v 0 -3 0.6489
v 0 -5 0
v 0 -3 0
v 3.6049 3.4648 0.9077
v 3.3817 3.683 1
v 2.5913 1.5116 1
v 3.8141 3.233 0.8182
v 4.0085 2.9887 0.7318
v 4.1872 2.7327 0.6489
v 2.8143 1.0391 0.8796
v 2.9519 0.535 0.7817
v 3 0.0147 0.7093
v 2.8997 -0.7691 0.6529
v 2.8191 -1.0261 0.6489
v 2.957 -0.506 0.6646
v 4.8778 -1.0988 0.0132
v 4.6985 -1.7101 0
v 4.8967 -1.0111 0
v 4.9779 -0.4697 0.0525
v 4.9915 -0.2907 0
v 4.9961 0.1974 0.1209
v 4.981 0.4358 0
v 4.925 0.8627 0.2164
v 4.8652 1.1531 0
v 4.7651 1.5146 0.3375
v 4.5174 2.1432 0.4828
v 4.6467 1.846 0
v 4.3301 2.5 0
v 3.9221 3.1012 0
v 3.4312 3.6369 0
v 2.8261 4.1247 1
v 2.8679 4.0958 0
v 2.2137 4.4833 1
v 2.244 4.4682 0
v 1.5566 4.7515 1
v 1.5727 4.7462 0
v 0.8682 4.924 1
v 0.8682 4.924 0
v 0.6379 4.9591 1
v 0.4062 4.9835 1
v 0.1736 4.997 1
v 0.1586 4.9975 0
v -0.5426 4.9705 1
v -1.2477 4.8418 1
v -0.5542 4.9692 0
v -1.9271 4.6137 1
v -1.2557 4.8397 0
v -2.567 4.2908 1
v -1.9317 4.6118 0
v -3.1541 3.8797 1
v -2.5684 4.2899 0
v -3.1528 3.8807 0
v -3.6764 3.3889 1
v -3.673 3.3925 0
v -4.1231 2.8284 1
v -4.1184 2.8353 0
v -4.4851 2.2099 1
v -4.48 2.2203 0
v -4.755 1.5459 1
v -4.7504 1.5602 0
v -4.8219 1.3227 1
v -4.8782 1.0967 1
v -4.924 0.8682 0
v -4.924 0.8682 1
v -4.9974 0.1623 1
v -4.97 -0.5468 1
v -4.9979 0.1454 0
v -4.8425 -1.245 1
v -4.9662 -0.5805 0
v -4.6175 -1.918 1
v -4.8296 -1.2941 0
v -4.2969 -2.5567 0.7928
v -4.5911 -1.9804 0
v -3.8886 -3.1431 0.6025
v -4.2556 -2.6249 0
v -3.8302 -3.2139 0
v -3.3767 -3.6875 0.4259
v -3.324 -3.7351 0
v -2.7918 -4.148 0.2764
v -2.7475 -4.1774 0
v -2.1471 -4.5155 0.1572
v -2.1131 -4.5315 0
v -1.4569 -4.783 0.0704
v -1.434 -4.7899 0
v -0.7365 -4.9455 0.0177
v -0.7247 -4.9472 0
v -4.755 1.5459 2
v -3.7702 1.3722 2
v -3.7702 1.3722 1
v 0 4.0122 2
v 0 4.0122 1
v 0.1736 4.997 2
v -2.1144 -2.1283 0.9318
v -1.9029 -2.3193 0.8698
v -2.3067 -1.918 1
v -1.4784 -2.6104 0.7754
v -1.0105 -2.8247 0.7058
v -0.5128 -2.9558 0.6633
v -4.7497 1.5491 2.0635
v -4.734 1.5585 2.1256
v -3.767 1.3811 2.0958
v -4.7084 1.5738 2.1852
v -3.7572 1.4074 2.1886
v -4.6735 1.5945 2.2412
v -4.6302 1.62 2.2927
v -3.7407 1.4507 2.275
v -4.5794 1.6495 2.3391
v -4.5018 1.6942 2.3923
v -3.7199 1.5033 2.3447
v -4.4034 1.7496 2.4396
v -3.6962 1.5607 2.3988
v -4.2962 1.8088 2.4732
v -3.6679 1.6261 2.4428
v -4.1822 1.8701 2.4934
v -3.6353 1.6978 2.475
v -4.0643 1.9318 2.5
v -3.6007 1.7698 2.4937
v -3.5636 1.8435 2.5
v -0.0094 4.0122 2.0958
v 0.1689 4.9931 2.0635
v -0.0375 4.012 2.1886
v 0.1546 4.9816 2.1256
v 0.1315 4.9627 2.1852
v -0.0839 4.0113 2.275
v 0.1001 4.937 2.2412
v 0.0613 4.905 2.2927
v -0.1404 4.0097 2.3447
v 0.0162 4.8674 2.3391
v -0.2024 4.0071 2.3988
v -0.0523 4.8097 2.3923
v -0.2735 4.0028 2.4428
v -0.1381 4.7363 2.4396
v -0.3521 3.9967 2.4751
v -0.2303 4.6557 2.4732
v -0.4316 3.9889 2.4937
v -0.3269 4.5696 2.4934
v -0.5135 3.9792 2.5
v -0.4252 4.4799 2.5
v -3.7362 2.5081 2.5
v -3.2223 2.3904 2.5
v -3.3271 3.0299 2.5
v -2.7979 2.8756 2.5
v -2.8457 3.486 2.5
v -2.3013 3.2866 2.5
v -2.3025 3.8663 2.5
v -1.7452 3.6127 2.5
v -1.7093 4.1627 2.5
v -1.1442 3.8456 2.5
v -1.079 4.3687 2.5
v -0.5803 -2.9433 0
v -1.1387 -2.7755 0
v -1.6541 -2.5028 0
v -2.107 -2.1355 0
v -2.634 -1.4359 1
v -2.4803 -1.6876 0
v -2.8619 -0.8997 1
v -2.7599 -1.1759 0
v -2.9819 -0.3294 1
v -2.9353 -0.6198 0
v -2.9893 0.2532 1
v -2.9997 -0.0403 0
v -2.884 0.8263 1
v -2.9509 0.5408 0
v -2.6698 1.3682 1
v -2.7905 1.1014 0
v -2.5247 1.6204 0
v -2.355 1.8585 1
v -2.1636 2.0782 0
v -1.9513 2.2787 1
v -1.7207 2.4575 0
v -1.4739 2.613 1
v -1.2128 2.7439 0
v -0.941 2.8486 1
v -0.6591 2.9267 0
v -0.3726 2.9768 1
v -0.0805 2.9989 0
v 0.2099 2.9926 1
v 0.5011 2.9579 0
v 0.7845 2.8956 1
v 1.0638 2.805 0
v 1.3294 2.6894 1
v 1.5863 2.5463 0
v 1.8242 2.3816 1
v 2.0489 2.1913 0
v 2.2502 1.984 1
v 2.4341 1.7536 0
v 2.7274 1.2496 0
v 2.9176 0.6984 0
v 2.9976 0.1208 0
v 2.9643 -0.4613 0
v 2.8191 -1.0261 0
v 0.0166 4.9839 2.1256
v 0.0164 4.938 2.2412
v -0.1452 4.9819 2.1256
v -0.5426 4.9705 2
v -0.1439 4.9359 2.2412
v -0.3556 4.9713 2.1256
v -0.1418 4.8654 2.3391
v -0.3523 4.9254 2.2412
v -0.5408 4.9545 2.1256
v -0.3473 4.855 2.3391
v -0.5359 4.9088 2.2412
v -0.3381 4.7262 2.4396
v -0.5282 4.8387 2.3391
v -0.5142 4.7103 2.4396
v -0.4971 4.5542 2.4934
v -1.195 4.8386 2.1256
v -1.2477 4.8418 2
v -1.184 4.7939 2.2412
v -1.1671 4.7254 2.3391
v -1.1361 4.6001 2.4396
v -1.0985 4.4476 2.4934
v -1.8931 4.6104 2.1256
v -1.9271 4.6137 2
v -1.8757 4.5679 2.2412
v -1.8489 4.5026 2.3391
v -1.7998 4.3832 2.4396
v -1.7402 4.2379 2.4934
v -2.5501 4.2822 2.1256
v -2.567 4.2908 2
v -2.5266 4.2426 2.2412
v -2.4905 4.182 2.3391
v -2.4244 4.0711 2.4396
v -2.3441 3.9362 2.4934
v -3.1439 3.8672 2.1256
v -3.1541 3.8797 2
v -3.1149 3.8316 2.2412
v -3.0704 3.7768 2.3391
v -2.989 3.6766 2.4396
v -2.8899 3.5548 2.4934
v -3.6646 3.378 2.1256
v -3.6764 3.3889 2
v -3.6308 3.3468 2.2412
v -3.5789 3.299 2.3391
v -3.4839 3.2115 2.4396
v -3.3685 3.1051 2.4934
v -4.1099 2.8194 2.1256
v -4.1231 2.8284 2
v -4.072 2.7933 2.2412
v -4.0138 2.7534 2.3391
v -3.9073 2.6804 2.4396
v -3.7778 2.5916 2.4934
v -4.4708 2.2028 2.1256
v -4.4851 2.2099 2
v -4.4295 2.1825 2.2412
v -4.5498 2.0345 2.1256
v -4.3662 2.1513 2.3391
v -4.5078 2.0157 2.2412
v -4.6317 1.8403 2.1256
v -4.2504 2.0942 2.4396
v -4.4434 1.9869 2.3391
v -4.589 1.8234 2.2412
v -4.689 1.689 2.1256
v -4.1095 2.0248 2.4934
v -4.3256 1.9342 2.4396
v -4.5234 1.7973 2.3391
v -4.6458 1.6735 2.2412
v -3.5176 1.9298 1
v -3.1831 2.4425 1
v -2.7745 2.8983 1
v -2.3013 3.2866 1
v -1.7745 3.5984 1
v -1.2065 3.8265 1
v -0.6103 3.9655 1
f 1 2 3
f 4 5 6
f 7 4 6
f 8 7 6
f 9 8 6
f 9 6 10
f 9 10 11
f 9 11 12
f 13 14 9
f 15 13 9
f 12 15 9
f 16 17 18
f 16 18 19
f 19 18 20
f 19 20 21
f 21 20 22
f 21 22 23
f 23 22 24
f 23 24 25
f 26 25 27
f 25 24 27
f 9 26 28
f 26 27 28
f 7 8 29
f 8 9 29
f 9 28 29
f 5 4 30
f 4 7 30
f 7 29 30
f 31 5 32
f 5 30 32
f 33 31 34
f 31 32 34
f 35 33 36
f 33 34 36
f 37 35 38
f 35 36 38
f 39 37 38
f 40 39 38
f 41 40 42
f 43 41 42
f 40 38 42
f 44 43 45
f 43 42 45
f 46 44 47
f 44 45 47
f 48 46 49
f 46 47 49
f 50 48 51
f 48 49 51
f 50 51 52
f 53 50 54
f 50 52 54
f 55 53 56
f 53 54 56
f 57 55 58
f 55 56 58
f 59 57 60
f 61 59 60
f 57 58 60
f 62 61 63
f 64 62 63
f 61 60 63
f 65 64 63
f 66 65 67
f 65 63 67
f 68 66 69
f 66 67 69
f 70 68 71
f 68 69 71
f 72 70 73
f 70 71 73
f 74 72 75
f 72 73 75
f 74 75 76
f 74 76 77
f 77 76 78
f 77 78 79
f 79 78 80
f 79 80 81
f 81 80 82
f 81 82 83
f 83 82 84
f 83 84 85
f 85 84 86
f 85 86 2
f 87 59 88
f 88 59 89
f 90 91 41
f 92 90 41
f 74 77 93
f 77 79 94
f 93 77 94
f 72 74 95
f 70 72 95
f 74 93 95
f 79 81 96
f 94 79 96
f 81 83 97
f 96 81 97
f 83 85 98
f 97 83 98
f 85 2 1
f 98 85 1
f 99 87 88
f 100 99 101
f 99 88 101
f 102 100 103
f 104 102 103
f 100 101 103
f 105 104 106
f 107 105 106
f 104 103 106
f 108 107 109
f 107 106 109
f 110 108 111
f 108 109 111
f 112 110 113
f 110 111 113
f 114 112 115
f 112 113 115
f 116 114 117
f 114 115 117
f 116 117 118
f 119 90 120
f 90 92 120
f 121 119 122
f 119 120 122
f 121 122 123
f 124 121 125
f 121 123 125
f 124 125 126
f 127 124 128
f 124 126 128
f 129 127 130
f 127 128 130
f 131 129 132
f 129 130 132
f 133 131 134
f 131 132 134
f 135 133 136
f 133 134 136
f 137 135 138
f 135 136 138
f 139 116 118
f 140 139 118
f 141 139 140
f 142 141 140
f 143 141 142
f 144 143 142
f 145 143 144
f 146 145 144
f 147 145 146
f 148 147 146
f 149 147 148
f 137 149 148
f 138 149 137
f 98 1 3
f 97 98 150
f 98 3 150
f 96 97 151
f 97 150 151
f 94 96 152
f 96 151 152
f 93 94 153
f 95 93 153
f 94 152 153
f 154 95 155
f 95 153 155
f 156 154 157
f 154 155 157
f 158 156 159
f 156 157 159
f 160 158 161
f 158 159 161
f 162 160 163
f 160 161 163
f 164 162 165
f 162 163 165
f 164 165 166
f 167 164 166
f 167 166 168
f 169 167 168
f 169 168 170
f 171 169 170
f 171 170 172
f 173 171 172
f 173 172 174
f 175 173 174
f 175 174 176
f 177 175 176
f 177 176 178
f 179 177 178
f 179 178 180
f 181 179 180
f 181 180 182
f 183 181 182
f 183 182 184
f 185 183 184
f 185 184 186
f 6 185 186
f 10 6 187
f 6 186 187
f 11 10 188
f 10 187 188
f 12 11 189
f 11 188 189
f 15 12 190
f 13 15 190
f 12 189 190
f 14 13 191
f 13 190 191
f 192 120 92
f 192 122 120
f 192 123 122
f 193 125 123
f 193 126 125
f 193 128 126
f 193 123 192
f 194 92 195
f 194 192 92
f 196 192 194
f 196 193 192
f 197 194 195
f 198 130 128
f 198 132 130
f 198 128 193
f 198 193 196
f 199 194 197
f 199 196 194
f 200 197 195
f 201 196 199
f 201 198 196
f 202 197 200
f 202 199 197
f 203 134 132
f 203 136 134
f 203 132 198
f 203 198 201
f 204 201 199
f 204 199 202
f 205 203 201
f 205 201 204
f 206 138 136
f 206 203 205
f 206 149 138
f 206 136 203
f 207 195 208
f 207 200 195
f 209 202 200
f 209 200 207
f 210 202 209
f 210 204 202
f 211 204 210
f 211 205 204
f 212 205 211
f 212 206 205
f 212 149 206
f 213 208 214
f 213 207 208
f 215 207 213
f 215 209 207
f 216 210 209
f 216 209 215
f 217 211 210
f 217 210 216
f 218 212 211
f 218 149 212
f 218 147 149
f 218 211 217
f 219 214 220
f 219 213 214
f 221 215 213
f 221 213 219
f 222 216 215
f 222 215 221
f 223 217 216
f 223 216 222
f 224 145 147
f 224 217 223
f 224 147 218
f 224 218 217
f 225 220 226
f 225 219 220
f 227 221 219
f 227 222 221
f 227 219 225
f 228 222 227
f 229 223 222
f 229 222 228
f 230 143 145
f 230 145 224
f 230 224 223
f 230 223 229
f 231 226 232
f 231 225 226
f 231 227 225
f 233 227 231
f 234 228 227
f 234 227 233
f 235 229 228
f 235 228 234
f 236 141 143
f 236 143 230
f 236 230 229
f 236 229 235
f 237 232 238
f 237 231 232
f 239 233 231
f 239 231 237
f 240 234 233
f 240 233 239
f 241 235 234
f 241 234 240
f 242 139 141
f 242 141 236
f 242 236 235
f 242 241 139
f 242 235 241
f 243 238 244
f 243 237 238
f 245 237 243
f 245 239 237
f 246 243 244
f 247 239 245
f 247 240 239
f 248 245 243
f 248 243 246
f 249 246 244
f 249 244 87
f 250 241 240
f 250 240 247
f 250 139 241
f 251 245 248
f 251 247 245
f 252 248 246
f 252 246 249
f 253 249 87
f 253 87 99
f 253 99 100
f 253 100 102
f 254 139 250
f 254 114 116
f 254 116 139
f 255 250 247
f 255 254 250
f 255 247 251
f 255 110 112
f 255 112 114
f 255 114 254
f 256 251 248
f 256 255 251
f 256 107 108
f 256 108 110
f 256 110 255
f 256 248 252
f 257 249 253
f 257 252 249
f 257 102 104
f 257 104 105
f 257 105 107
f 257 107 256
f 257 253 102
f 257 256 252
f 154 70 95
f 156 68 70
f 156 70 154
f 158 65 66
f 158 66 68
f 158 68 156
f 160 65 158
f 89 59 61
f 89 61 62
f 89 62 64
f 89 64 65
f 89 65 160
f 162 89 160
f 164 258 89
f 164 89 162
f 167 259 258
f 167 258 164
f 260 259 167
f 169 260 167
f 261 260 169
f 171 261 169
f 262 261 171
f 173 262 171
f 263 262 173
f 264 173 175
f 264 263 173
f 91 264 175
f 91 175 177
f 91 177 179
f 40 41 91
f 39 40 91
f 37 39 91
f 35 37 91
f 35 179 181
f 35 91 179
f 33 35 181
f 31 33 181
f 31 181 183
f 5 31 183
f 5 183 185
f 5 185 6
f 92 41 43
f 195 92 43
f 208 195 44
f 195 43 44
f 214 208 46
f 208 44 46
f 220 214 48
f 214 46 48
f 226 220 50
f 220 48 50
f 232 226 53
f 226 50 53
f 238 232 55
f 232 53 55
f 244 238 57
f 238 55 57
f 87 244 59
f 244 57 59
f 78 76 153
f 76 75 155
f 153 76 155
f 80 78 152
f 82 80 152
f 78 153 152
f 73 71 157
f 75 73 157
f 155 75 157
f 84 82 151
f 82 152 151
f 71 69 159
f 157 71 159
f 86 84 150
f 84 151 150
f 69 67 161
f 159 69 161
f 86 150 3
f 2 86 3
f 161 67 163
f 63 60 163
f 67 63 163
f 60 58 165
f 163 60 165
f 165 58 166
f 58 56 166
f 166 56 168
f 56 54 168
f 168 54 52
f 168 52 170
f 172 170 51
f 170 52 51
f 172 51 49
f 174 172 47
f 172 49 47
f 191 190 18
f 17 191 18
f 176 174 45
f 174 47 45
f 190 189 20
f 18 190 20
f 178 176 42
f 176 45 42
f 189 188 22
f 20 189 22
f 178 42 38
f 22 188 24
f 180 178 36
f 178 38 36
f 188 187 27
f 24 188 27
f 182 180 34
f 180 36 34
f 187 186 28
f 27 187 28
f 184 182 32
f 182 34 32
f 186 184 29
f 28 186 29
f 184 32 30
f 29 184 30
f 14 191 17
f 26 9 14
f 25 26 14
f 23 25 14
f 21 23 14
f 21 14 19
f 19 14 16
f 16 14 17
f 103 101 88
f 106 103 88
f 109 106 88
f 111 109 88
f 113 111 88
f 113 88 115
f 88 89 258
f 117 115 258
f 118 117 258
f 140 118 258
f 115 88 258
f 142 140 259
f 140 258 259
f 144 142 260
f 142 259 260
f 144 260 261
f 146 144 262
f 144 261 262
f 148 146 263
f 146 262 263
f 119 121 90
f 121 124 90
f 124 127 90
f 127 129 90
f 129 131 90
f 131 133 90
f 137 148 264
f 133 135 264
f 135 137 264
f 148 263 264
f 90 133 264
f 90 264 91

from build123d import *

# Parameters (mm, degrees)
F1_DEPTH = 1
F3_DEPTH = 25
F5_DEPTH = 25
F7_DEPTH = 1.5
F8_R     = 0.5


with BuildPart() as f1:
    # F0 (on Top) → F1 (new body)
    with BuildSketch(Plane.XY):
        with BuildLine():
            ThreePointArc((0, -3), (-1.7207293091, 2.4574561329), (2.8190778624, -1.02606043))
            Line((2.8190778624, -1.02606043), (4.6984631039, -1.7101007166))
            ThreePointArc((4.6984631039, -1.7101007166), (4.3301270189, 2.5), (0.8682408883, 4.9240387651))
            Line((0.8682408883, 4.9240387651), (0.6945927107, 3.939231012))
            ThreePointArc((0.6945927107, 3.939231012), (-2.2943057454, 3.2766081772), (-3.939231012, 0.6945927107))
            Line((-3.939231012, 0.6945927107), (-4.9240387651, 0.8682408883))
            ThreePointArc((-4.9240387651, 0.8682408883), (-3.8302222156, -3.2139380484), (0, -5))
            Line((0, -5), (0, -3))
        make_face()
        with BuildLine():
            Line((0.6945927107, 3.939231012), (0.8682408883, 4.9240387651))
            ThreePointArc((0.8682408883, 4.9240387651), (-2.8678821818, 4.0957602214), (-4.9240387651, 0.8682408883))
            Line((-4.9240387651, 0.8682408883), (-3.939231012, 0.6945927107))
            ThreePointArc((-3.939231012, 0.6945927107), (-2.2943057454, 3.2766081772), (0.6945927107, 3.939231012))
        make_face()
    extrude(amount=F1_DEPTH)

    # F2 (on face) → F3 (cut)
    with BuildSketch(Plane(origin=(0, 0, 0), x_dir=(0.9396926208, -0.3420201433, 0), z_dir=(-0.3420201433, -0.9396926208, 0))):
        Polygon((3, 0.6489407005), (5, 0), (5, 1), (3, 1), align=None)
        Polygon((1.9180543022, 1), (3, 0.6489407005), (3, 1), align=None)
    extrude(amount=-F3_DEPTH, mode=Mode.SUBTRACT)

    # F4 (on face) → F5 (cut)
    with BuildSketch(Plane.YZ):
        Polygon((-5, 1), (-5, 0), (-1.91805, 1), align=None)
    extrude(amount=-F5_DEPTH, mode=Mode.SUBTRACT)

    # F6 (on face) → F7 (join)
    with BuildSketch(Plane.XY.offset(1)):
        with BuildLine():
            ThreePointArc((-3.7702121506, 1.3722449997), (-2.3012895939, 3.2865821464), (0, 4.0121759682))
            Line((0, 4.0121759682), (0.1736481777, 4.9969837212))
            ThreePointArc((0.1736481777, 4.9969837212), (-2.8678821818, 4.0957602214), (-4.7550199037, 1.5458931774))
            Line((-4.7550199037, 1.5458931774), (-3.7702121506, 1.3722449997))
        make_face()
    extrude(amount=F7_DEPTH)

    # F8
    f8_edges = [f1.edges().sort_by_distance(p)[0] for p in [
        (-4.262616, 1.459069, 2.5),
        (0.086824, 4.50458, 2.5),
        (-2.867882, 4.09576, 2.5),
    ]]
    fillet(f8_edges, radius=F8_R)


solid = f1.part
